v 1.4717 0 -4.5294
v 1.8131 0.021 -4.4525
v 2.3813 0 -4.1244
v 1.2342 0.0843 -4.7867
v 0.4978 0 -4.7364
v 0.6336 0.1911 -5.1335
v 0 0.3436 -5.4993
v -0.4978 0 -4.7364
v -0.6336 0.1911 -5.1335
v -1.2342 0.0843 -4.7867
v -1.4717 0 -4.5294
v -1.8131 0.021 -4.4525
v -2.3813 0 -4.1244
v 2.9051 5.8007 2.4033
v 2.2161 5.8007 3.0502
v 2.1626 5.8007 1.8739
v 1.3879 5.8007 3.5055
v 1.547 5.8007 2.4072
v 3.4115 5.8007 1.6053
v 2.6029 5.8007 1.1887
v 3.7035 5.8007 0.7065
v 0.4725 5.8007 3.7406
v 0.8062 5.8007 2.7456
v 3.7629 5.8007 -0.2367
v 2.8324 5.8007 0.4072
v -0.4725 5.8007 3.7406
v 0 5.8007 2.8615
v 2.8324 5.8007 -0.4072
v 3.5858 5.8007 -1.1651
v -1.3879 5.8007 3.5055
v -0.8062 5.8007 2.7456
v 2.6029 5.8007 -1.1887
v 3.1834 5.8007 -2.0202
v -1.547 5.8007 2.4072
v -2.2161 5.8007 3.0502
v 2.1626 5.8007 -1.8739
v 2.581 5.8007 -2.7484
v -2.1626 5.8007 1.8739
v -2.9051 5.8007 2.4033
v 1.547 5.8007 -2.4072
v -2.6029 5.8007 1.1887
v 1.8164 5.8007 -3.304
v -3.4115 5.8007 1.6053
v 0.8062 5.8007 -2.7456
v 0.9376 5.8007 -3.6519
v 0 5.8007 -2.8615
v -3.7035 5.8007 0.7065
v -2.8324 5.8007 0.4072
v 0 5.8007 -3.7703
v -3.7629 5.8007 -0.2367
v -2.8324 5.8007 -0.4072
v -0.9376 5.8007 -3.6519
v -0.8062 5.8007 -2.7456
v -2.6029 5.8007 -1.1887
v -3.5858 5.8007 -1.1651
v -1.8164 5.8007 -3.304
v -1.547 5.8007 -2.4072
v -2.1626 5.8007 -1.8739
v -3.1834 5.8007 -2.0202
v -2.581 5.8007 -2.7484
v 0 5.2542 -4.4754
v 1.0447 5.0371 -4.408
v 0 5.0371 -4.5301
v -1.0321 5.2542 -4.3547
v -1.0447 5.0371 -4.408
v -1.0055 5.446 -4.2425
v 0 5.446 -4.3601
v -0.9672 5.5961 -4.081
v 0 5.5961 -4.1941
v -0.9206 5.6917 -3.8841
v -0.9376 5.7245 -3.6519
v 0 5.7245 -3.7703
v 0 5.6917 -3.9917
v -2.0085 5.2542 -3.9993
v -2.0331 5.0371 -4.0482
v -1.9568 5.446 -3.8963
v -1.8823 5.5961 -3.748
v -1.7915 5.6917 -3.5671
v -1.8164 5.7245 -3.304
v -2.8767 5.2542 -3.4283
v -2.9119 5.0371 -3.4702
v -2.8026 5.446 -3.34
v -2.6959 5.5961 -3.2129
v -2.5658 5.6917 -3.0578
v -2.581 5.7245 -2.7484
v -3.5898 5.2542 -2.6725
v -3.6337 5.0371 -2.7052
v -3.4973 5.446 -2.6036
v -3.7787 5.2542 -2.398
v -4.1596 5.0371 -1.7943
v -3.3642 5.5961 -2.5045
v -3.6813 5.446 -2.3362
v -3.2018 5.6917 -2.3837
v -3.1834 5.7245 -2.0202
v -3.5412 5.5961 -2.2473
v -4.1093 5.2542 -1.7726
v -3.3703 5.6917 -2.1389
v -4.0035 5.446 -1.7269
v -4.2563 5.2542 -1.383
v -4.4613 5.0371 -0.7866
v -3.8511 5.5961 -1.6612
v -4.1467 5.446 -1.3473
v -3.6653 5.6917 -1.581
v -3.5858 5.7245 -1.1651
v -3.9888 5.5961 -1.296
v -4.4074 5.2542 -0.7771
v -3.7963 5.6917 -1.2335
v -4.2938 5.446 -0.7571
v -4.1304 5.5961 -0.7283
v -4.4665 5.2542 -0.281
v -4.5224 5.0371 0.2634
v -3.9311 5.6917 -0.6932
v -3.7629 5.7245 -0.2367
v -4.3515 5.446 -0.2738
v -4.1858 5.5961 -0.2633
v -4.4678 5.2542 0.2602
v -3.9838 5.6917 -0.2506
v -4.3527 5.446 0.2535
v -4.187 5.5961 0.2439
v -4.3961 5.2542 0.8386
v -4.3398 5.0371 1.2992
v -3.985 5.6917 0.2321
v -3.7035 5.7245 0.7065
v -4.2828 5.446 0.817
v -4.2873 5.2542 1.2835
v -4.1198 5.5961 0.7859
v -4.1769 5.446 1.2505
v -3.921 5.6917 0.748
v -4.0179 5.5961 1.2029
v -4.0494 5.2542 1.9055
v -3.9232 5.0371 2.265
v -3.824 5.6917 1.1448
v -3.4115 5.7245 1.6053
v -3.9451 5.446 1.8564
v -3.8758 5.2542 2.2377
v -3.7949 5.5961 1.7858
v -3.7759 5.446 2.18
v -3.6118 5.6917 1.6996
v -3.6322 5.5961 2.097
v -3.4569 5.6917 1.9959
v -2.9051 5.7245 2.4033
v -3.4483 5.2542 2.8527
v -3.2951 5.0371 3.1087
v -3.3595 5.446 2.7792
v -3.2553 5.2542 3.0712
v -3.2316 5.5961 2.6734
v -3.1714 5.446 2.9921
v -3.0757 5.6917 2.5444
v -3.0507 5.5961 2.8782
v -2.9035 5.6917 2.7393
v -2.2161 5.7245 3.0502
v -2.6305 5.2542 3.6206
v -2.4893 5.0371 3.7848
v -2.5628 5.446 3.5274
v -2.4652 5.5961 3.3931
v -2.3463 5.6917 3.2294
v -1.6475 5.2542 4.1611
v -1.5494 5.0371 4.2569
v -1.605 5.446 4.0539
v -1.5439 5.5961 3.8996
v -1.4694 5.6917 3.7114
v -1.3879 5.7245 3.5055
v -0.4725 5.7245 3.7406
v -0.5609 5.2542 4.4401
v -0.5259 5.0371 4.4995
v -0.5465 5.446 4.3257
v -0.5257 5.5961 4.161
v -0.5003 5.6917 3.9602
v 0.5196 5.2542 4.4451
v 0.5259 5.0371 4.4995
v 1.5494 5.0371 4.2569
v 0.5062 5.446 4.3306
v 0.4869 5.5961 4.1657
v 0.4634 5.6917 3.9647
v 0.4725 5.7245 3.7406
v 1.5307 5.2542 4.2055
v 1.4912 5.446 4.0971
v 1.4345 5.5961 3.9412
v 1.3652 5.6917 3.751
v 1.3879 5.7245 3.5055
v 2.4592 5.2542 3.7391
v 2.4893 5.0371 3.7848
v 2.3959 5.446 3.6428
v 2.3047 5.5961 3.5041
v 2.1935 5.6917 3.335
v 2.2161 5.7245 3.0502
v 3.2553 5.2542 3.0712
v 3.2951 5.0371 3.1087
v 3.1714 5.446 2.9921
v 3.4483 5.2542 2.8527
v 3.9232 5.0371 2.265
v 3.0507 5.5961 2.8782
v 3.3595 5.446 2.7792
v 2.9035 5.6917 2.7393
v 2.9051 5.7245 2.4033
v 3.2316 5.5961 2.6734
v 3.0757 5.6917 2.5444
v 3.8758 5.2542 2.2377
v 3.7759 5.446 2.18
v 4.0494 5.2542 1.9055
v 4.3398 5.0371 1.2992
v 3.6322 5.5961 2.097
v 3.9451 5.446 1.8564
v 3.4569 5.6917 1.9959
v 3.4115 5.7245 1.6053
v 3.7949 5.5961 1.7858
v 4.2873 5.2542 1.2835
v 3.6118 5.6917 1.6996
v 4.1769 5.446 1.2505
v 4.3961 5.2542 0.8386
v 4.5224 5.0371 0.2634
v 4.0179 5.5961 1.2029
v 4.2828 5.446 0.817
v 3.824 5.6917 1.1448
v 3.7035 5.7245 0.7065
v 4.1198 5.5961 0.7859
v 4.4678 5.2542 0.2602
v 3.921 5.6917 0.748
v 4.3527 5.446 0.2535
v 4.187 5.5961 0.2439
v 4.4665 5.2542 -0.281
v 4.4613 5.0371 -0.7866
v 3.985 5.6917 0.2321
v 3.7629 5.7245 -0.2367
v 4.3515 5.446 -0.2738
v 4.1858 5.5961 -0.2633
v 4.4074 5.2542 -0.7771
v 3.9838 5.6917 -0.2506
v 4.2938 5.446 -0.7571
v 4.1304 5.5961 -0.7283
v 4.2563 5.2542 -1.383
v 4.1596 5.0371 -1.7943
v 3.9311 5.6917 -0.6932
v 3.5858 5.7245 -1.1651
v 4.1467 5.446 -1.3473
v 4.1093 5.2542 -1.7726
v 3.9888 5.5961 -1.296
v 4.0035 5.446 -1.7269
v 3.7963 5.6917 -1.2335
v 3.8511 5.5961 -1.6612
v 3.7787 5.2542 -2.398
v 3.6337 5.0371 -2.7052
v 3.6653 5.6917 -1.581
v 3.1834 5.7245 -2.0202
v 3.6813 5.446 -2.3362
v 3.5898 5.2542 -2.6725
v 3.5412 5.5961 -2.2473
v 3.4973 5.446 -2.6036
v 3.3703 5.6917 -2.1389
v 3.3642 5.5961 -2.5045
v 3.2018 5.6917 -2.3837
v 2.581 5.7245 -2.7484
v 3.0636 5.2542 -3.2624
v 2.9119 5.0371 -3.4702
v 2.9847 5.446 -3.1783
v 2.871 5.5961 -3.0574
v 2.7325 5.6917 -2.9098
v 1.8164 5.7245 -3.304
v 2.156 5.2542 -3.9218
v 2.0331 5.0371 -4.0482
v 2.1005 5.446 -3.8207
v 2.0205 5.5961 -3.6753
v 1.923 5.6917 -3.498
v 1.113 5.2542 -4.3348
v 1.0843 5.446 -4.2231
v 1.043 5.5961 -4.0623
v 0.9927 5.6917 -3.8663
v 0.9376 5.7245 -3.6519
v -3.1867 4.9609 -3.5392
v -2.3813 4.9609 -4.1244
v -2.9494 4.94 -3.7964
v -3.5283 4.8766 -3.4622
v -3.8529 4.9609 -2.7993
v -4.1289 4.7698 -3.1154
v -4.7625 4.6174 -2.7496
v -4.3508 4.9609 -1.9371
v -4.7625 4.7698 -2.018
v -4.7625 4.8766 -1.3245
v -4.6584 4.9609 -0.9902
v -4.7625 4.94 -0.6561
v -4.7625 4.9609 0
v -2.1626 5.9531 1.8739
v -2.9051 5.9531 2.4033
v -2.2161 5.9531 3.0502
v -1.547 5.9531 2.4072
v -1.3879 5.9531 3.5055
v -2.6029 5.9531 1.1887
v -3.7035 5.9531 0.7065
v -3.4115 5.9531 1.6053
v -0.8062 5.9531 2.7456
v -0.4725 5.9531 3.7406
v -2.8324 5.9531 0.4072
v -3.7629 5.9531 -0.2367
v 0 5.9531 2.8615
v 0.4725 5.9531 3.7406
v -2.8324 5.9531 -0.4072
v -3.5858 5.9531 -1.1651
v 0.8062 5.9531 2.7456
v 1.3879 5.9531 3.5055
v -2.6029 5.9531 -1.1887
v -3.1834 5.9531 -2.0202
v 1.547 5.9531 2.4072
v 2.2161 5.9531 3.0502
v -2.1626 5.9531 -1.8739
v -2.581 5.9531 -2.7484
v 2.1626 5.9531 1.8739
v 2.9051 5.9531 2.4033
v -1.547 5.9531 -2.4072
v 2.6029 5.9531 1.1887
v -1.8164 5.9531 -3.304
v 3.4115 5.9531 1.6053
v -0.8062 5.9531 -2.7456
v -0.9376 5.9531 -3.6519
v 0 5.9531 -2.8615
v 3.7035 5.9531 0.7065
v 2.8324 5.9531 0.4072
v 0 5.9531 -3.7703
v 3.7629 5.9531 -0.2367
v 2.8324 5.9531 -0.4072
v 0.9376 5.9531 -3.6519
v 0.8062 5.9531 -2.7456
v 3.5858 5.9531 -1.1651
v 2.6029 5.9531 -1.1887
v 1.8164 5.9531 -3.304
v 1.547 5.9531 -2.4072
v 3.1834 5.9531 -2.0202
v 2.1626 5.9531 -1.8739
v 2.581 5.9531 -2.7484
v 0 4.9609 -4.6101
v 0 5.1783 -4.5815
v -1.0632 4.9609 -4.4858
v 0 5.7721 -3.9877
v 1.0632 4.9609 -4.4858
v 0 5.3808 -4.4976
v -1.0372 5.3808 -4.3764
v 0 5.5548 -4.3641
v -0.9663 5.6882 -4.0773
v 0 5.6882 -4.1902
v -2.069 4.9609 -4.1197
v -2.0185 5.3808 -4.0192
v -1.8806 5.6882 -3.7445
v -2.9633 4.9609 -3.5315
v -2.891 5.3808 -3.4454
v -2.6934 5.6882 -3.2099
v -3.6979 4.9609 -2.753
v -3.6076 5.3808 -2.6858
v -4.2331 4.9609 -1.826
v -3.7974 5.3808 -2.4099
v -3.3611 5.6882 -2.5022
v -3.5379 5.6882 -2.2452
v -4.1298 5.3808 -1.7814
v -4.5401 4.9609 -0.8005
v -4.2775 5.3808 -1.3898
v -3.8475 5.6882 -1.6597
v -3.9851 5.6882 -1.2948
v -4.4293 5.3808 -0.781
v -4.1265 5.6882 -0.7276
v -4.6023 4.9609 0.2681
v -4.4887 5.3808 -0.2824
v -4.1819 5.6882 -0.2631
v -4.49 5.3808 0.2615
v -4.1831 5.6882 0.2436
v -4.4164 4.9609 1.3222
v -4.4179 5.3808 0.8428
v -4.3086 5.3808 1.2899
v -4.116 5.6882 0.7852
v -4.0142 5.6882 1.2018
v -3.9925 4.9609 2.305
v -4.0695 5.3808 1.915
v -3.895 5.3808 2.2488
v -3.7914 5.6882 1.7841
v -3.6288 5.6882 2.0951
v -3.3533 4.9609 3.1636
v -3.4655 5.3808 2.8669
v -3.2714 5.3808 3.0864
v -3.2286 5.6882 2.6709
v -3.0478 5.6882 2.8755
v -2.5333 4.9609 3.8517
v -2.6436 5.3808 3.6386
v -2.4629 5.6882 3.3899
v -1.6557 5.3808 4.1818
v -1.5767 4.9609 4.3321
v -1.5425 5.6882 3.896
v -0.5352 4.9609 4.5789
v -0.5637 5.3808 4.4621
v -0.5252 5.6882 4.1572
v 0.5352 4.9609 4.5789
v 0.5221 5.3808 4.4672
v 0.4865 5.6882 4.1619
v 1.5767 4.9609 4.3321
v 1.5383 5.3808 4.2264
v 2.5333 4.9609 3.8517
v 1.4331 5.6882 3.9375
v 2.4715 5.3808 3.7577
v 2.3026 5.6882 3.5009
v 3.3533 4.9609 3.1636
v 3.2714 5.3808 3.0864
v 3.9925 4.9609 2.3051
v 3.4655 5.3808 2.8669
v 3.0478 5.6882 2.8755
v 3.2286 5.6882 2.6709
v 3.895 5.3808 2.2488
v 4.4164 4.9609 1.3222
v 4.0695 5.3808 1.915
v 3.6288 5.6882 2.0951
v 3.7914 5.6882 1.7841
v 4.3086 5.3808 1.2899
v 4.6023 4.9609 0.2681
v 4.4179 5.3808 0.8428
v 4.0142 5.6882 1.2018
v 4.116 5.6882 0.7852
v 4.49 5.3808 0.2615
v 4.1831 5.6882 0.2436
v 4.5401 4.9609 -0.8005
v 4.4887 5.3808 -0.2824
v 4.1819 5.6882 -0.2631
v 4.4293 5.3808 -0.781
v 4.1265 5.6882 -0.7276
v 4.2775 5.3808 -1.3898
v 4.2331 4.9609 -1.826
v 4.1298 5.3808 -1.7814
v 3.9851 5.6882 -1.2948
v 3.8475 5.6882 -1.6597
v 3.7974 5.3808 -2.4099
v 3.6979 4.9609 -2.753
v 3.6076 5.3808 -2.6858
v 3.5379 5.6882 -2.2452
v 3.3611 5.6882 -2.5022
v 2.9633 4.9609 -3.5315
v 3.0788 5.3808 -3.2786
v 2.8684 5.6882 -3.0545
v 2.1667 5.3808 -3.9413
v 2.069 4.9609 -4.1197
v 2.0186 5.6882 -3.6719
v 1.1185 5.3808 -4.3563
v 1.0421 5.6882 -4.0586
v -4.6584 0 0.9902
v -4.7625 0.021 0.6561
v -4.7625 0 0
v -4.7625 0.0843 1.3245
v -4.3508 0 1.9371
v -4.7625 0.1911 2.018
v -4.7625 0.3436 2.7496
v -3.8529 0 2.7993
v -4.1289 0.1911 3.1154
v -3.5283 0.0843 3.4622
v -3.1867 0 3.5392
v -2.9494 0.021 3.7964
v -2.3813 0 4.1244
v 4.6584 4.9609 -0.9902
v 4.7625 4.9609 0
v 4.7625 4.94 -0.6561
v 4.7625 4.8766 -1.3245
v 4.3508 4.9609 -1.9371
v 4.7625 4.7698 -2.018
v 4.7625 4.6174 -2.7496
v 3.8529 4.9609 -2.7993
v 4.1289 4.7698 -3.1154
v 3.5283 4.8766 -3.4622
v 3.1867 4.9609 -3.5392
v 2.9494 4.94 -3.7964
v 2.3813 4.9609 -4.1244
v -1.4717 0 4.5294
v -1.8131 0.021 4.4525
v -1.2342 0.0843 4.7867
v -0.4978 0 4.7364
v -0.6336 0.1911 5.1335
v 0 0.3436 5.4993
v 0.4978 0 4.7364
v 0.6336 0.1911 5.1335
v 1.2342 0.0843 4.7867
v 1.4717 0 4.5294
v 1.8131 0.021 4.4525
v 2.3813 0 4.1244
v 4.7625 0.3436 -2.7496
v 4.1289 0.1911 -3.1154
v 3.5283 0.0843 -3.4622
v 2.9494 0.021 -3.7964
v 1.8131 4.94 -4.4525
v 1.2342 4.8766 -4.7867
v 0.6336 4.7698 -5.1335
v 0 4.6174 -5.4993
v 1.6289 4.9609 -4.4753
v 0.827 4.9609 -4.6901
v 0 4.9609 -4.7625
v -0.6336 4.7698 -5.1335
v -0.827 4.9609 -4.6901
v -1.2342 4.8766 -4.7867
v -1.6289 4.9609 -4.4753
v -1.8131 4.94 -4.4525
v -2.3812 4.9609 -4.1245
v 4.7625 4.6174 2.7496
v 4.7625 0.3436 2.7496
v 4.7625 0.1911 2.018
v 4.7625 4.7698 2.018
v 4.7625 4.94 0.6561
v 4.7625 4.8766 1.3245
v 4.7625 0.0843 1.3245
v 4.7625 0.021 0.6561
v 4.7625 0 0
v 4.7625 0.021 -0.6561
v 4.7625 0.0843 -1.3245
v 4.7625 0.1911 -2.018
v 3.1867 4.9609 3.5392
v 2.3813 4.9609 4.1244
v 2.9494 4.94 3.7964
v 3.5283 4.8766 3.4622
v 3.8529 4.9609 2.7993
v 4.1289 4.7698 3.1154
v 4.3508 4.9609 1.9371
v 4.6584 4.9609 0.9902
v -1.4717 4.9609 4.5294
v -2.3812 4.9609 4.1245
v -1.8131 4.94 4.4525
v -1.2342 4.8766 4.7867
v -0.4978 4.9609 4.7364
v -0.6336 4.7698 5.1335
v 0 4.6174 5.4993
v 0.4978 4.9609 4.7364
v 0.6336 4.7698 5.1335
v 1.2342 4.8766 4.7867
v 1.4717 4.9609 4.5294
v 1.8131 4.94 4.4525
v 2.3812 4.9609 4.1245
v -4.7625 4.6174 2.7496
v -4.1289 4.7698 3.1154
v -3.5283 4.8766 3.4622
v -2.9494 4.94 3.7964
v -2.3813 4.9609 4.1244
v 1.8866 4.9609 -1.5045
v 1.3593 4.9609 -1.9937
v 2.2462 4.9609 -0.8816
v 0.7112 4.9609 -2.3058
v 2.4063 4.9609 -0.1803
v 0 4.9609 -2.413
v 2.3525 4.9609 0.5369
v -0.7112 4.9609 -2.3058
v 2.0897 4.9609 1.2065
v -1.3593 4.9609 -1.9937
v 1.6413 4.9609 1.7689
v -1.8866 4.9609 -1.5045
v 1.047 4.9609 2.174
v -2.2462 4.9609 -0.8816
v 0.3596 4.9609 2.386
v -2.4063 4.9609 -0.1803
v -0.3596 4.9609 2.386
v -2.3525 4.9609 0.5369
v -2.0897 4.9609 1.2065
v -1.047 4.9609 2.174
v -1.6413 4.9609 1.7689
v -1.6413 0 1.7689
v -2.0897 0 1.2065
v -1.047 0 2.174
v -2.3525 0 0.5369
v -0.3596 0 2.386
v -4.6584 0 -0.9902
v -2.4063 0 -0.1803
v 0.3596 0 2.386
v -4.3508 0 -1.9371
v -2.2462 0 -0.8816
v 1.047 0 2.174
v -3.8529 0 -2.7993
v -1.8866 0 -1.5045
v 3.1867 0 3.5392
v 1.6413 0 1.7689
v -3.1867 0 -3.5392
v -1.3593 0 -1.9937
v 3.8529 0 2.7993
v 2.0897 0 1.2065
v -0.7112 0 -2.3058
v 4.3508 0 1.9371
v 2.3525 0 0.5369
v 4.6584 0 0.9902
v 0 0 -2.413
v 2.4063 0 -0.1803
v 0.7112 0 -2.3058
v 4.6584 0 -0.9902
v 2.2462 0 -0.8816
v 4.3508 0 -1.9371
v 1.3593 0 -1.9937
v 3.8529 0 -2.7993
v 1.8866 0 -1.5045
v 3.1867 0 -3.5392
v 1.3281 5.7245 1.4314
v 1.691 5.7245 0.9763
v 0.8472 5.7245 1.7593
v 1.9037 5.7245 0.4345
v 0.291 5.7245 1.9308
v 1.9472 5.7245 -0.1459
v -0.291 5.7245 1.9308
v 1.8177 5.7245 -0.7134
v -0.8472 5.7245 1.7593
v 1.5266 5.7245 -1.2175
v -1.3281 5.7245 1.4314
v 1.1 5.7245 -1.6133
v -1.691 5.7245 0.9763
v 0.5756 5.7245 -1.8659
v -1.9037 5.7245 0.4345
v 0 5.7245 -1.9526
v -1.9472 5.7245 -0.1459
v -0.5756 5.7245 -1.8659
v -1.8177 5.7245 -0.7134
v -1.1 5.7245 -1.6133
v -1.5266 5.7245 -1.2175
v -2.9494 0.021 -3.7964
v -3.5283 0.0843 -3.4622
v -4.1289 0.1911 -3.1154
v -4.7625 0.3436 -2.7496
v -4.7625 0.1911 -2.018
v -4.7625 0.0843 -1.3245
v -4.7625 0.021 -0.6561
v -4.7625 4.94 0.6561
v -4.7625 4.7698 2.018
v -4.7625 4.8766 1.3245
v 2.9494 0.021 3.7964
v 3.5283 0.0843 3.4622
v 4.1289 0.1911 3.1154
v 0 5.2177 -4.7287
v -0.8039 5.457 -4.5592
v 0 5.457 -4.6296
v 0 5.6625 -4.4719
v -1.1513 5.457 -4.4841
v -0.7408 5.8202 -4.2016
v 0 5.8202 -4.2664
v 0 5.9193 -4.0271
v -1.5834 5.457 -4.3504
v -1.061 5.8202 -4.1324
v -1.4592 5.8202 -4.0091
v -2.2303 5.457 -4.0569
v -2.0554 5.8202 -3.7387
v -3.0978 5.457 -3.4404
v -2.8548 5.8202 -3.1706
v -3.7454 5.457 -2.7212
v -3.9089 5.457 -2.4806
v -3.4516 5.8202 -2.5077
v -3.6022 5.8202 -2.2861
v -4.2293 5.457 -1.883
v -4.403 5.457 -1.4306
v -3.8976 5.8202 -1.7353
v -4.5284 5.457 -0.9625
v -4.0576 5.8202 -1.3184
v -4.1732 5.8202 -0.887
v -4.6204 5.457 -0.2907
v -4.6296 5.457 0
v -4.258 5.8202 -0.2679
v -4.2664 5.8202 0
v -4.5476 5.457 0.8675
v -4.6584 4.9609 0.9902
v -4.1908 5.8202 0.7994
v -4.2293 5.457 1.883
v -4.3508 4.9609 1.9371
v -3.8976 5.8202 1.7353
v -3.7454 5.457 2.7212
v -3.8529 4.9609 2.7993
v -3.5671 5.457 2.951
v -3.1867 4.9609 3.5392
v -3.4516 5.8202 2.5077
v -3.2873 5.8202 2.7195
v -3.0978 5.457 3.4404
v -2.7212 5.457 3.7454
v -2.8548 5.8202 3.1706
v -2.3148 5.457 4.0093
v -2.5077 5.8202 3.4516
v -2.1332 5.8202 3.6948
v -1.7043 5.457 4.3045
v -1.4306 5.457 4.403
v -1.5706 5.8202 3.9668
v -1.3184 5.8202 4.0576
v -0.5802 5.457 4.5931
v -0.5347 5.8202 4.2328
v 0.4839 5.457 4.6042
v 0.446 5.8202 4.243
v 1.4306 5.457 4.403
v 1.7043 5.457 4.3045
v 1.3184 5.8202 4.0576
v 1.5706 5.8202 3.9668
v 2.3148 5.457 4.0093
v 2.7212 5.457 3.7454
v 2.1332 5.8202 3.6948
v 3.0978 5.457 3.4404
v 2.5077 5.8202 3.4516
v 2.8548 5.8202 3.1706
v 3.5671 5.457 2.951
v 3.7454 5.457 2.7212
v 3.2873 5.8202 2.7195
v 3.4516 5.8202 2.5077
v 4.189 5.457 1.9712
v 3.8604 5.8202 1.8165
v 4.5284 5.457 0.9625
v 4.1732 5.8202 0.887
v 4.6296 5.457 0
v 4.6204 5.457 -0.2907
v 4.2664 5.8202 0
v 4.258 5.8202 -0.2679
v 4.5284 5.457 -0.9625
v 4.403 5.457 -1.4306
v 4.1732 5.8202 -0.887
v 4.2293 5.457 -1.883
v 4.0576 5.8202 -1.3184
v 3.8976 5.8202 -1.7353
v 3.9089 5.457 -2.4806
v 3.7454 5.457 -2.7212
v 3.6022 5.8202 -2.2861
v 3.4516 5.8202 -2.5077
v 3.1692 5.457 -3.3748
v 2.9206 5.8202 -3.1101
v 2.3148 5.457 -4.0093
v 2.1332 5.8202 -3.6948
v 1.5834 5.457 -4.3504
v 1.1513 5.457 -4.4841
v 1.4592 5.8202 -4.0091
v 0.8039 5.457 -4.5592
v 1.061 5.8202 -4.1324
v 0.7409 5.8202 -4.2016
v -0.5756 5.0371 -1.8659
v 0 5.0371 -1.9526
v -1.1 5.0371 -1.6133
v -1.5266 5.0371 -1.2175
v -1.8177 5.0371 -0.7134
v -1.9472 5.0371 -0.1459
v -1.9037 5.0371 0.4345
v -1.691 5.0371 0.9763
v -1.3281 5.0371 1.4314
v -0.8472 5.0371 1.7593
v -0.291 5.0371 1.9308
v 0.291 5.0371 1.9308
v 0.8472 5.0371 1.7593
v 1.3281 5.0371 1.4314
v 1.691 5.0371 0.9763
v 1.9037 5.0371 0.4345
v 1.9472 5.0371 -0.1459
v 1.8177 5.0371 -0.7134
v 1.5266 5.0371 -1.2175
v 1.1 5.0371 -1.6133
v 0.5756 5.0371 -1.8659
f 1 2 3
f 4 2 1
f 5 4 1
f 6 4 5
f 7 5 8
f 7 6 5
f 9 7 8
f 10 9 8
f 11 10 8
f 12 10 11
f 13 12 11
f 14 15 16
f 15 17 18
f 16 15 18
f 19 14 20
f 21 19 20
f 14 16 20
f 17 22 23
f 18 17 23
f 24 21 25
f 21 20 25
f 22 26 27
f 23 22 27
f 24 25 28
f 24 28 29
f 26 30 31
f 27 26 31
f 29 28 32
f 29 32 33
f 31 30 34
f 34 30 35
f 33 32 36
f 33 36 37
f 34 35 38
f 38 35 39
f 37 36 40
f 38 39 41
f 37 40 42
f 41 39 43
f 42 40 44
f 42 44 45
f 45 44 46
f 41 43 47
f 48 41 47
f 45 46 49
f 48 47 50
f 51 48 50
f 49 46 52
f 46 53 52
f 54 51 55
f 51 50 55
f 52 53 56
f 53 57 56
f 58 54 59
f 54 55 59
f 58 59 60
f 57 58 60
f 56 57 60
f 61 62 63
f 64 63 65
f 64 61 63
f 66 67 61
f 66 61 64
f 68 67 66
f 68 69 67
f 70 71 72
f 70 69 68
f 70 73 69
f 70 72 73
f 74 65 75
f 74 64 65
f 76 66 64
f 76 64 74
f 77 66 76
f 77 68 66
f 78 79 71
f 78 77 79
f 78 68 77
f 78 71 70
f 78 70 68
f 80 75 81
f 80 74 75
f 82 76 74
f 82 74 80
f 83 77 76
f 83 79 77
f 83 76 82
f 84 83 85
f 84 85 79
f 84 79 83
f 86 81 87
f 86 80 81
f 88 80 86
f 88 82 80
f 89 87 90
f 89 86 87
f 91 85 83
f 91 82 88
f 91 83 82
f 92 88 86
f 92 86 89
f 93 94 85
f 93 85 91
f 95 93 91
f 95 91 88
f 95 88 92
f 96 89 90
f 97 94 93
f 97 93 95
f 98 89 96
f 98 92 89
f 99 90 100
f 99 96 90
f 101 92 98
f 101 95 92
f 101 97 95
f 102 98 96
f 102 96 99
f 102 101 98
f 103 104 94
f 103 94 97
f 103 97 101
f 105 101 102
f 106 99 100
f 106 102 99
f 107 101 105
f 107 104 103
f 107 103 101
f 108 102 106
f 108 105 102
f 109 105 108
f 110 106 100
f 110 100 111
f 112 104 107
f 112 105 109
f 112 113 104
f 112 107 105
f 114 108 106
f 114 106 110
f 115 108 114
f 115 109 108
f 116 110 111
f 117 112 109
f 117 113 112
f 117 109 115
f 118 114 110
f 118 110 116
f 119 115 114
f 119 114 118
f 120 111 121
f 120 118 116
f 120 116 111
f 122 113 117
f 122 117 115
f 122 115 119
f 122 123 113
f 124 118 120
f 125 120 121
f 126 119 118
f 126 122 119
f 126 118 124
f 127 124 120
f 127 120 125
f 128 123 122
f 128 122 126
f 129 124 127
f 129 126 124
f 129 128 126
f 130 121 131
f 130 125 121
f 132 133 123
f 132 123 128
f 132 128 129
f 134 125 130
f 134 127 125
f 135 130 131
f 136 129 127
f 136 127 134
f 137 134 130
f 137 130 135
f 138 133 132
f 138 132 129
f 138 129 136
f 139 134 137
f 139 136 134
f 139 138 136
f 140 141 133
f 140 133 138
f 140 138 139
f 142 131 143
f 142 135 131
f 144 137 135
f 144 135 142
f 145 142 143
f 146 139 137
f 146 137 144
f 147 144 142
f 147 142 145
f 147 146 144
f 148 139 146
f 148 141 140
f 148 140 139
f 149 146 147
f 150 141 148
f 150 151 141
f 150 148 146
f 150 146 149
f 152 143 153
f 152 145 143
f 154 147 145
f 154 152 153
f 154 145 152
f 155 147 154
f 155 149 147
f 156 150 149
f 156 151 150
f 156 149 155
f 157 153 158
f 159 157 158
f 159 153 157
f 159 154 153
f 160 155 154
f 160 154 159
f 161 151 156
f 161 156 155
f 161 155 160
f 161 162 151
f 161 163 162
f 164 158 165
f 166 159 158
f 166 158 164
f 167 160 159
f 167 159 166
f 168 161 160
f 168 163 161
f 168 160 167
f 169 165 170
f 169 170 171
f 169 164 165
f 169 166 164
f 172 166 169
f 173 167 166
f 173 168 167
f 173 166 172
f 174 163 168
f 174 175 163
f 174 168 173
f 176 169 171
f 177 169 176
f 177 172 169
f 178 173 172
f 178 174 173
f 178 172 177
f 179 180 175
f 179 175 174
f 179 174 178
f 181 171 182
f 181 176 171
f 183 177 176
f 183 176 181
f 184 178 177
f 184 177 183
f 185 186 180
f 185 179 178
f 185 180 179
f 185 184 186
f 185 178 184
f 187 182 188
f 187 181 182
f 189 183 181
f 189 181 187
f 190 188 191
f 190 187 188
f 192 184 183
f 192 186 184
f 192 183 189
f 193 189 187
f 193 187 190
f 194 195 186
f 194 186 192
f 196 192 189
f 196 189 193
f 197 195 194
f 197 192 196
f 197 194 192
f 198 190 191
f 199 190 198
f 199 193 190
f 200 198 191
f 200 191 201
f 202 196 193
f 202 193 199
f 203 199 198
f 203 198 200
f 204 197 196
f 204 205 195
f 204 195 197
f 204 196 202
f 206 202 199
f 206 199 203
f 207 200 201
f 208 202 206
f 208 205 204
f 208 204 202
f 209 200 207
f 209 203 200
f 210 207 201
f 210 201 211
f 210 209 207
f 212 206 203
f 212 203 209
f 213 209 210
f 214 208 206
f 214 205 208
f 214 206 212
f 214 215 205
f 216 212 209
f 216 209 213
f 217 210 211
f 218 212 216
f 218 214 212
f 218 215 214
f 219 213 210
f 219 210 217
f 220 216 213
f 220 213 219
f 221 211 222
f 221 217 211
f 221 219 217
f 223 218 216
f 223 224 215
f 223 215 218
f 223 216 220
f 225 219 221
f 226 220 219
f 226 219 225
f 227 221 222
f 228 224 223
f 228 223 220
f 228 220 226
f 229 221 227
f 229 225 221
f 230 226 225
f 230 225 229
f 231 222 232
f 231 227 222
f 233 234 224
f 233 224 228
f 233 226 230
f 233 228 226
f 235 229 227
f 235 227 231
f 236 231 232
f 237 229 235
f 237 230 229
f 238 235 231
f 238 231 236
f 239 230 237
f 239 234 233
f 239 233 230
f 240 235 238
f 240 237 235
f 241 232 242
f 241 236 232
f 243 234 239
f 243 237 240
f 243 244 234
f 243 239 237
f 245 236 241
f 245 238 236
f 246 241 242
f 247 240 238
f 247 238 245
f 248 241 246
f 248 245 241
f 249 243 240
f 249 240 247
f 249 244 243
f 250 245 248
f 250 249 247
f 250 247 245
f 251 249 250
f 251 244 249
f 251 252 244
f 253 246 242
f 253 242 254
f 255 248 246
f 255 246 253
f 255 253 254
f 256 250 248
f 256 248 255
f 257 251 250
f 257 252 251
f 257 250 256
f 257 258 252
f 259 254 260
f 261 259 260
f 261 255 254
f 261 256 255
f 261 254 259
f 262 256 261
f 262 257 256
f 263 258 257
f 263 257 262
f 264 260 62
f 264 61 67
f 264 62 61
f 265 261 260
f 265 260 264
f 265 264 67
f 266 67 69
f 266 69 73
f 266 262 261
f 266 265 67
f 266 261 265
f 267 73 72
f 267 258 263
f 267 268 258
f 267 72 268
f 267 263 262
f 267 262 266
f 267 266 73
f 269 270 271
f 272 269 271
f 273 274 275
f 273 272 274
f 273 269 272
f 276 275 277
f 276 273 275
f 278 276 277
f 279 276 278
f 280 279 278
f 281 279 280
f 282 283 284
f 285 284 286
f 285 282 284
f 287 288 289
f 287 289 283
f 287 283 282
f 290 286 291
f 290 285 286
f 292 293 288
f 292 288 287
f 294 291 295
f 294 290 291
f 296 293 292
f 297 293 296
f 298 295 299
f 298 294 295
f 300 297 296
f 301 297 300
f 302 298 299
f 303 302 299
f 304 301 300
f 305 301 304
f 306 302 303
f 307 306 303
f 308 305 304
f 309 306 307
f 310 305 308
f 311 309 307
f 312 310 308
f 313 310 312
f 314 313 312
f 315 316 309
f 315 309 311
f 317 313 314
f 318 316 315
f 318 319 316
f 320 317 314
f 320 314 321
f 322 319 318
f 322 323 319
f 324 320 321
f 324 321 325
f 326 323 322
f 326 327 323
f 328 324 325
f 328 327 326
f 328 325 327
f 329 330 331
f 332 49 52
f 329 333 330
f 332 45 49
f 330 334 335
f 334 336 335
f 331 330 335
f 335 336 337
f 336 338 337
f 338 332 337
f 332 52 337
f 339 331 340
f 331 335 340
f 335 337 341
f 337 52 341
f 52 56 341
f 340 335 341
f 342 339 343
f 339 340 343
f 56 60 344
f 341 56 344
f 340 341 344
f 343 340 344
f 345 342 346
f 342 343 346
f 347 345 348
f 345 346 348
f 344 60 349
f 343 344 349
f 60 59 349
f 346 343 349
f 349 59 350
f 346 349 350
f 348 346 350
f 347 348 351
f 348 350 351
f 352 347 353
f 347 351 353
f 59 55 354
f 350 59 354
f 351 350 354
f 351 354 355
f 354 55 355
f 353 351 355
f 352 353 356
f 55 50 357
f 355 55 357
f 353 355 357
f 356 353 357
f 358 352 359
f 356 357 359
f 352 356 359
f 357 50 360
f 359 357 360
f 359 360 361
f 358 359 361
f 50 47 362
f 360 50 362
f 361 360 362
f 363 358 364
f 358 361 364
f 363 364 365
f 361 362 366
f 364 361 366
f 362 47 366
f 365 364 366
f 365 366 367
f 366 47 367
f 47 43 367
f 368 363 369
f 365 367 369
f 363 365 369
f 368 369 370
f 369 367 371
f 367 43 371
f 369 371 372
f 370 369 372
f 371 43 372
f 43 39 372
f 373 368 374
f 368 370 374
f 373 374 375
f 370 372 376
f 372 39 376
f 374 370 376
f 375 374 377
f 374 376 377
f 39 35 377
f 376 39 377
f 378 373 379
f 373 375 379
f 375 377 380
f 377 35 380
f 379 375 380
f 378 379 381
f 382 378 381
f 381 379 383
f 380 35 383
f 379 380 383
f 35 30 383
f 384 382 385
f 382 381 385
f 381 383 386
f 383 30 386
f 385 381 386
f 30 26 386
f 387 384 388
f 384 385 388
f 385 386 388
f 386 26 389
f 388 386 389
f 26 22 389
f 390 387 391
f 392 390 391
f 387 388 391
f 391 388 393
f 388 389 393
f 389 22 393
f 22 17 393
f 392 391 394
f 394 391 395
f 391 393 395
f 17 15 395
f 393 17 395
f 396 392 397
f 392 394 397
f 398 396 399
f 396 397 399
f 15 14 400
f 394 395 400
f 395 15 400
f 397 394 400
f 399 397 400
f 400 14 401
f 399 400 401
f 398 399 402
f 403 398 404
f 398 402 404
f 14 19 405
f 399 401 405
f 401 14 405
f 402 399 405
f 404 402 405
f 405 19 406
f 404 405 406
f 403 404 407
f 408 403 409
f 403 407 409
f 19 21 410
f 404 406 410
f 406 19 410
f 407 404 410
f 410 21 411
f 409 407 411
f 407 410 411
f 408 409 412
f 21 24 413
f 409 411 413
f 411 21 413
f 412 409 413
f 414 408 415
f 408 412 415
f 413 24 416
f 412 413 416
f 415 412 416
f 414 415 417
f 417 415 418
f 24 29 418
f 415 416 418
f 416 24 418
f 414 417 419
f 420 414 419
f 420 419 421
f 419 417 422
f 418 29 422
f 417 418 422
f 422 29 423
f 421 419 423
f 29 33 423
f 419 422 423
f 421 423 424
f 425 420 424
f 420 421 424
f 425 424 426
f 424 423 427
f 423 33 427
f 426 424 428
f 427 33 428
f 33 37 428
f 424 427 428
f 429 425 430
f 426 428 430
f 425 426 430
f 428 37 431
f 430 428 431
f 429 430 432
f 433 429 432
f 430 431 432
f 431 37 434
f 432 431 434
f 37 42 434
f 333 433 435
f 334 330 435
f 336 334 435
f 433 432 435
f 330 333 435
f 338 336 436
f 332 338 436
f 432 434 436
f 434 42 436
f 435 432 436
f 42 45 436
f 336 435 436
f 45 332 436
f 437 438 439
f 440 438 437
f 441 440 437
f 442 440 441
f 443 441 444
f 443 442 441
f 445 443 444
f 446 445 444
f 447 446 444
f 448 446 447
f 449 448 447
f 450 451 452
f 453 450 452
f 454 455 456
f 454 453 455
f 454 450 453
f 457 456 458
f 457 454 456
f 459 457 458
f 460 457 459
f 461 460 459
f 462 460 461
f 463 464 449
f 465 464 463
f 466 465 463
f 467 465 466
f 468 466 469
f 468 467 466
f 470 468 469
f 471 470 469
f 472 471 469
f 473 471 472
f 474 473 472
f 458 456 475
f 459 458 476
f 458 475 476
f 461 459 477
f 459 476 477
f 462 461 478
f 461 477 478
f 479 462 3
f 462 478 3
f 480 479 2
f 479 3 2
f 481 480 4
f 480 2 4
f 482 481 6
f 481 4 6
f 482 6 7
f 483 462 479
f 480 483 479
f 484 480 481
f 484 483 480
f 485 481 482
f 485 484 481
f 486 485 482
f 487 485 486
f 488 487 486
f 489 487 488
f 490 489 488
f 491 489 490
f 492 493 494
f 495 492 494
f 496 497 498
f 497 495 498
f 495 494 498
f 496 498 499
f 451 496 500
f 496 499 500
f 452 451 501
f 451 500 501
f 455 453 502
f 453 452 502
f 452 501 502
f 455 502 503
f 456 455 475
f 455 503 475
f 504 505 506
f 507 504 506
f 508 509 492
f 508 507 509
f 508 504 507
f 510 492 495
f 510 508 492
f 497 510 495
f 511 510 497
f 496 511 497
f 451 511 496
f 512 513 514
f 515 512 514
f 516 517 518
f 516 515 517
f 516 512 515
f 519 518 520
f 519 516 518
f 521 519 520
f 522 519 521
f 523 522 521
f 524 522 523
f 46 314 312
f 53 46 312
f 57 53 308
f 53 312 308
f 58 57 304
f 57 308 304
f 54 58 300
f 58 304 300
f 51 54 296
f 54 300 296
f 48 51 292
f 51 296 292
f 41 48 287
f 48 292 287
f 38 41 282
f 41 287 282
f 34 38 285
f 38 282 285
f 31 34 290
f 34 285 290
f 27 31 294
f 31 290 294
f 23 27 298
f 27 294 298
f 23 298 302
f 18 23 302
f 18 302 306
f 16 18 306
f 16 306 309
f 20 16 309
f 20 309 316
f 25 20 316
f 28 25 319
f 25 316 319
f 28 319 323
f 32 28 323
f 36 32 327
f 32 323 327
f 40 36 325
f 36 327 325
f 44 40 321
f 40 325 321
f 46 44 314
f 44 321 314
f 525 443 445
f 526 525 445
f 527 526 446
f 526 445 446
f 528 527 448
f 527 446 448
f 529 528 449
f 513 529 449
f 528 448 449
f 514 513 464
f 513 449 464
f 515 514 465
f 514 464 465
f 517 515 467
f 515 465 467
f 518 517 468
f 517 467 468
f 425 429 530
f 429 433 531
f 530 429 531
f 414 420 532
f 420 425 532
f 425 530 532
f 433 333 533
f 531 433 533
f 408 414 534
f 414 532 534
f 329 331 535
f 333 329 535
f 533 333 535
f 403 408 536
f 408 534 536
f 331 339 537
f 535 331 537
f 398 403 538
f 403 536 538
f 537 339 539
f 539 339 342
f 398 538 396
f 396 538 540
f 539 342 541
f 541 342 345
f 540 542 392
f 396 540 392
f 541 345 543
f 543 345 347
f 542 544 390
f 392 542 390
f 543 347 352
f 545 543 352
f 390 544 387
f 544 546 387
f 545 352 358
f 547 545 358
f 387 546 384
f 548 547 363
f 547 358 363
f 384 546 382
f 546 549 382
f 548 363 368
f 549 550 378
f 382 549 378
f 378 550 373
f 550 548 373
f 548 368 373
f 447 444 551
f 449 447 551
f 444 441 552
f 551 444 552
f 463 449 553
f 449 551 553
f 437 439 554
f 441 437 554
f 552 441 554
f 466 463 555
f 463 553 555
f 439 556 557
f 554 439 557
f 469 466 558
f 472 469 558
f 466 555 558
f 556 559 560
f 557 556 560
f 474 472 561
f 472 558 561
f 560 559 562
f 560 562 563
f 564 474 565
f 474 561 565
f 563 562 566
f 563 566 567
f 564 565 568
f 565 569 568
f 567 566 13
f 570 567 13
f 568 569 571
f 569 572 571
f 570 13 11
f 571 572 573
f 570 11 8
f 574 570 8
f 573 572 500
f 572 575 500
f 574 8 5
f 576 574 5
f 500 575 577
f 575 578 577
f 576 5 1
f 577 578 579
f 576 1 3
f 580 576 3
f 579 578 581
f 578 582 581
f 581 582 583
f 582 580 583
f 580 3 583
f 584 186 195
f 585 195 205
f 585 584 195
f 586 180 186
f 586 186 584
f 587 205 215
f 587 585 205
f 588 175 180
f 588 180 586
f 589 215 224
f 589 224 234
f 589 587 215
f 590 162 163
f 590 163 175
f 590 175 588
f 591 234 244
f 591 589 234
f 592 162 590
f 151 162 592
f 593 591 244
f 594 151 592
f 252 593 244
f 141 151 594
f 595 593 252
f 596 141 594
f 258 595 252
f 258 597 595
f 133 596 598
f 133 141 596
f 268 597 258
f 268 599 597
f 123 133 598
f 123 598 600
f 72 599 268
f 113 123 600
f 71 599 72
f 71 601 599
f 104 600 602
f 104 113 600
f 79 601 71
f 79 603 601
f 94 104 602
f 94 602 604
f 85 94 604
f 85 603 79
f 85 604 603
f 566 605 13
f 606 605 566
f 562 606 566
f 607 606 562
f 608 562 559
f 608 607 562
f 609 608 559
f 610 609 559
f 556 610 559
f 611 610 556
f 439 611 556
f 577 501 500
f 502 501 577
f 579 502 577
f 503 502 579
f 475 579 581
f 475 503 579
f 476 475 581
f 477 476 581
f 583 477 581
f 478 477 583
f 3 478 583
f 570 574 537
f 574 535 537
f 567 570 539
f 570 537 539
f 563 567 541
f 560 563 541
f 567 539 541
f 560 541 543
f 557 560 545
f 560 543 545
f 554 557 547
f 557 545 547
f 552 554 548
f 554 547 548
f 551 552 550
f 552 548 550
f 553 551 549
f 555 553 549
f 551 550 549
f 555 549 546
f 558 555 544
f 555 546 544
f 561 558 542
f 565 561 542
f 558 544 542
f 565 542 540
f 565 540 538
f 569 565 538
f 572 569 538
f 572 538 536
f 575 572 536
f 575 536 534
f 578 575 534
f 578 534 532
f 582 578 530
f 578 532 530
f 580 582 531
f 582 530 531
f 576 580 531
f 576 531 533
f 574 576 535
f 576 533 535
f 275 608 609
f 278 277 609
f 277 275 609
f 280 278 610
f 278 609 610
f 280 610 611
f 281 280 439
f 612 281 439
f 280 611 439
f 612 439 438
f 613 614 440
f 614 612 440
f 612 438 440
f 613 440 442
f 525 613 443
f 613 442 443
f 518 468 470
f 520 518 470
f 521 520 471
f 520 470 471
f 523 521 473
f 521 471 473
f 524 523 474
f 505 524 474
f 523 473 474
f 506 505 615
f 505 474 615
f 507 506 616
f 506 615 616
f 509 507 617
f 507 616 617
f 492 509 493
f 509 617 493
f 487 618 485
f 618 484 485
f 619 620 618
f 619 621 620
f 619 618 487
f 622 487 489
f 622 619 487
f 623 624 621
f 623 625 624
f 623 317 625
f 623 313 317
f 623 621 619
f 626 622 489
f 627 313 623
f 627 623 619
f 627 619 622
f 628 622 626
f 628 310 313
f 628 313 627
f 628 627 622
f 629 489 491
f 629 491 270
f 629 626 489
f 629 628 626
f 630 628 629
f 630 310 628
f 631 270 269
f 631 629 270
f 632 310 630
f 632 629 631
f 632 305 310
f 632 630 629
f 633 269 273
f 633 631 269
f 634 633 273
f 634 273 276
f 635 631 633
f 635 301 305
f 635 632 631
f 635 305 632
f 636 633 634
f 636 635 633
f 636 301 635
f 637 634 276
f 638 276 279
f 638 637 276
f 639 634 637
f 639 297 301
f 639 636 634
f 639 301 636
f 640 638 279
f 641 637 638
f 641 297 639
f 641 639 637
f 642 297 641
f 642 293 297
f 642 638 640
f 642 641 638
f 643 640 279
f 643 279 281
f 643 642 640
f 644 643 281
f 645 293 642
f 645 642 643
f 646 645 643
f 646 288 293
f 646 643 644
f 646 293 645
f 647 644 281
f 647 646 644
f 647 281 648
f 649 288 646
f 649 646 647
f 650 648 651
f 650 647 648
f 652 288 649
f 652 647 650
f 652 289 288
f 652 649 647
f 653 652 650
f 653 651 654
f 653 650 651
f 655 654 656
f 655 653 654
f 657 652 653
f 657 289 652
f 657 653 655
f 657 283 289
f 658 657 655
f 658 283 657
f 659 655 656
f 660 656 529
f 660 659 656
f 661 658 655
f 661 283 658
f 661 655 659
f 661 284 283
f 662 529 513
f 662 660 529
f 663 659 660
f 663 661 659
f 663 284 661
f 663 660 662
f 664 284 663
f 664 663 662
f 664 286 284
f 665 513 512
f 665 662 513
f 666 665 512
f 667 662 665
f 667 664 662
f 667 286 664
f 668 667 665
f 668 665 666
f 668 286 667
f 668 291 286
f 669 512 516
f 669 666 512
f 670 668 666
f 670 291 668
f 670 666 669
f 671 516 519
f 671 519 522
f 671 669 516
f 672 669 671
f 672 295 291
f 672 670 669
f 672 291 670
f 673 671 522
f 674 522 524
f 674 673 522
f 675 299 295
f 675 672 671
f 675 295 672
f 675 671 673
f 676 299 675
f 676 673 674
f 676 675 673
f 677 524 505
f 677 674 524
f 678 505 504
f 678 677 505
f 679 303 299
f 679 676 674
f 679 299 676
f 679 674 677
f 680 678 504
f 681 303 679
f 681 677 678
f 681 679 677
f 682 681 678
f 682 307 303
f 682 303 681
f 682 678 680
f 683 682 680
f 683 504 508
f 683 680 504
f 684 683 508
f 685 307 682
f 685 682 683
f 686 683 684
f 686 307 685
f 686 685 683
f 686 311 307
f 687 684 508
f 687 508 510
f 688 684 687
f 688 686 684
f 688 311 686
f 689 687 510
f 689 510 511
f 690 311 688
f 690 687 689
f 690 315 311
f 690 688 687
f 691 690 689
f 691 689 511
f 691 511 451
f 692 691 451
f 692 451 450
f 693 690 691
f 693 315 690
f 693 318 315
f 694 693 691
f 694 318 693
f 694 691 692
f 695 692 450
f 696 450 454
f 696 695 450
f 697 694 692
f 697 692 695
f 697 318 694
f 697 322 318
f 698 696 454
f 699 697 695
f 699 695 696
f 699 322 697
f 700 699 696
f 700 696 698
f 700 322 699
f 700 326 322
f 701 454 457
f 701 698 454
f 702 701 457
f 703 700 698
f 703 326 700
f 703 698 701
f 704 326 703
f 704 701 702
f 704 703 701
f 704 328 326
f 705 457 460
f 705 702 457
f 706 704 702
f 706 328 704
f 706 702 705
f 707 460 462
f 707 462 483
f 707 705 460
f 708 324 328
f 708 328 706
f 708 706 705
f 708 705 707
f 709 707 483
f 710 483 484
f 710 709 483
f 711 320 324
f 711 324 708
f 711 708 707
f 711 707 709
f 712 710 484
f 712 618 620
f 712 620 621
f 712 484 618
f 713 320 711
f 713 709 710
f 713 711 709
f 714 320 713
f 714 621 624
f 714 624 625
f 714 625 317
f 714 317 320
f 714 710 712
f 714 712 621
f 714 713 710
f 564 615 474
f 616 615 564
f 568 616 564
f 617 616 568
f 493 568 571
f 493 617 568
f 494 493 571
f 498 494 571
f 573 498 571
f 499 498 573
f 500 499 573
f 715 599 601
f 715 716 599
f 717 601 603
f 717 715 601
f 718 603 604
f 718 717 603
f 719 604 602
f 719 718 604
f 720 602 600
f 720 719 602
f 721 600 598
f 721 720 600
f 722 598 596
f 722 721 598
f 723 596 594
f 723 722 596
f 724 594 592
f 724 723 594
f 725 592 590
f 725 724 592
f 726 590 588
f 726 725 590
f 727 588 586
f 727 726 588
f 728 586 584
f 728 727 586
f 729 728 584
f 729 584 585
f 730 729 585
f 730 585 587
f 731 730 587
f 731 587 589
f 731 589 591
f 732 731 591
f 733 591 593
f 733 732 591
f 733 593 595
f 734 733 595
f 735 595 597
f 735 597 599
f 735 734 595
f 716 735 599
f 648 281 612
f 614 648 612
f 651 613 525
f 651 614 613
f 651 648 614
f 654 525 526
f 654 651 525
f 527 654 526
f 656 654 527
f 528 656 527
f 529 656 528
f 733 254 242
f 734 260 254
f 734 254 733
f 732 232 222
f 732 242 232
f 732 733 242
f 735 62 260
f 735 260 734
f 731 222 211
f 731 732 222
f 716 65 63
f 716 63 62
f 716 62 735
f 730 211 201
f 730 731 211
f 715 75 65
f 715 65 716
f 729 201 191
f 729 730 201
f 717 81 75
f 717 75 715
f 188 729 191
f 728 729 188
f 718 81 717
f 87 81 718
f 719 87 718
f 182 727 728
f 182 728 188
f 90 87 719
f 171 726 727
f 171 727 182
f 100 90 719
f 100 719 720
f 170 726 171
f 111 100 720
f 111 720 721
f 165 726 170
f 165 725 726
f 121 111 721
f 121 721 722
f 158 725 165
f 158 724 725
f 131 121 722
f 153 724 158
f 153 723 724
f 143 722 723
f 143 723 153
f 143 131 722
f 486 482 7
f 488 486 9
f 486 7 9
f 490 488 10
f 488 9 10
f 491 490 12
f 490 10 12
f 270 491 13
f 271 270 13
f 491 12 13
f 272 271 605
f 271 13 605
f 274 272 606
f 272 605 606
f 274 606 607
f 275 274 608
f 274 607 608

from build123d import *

# Parameters (mm, degrees)
EXTRUDE1_DEPTH = 5.953125
SKETCH2_W      = 2.413
SKETCH2_H      = 5.953125


with BuildPart() as part:
    # Sketch1 → Extrude1 (new body)
    with BuildSketch(Plane(origin=(0, 0, 0), x_dir=(1, 0, 0), z_dir=(0, 1, 0))):
        Polygon((0, 5.499261314), (-4.7625, 2.749630657), (-4.7625, -2.749630657), (0, -5.499261314), (4.7625, -2.749630657), (4.7625, 2.749630657), align=None)
    extrude(amount=EXTRUDE1_DEPTH)

    # Sketch4 → Cut-Revolve2 (revolve, cut)
    with BuildSketch(Plane(origin=(0, 0, 0), x_dir=(0, 0, -1), z_dir=(1, 0, 0))):
        Polygon((0, 5.953125), (2.413, 5.953125), (1.952639712, 5.738455472), (1.952639712, 0.214669528), (2.413, 0), (0, 0), align=None)
    revolve(axis=Axis((0, 5.953125, 0), (0, 1, 0)), mode=Mode.SUBTRACT)


with BuildPart() as body_2:
    # Sketch2 → Revolve1 (revolve)
    with BuildSketch(Plane(origin=(0, 0, 0), x_dir=(0, 0, -1), z_dir=(1, 0, 0))):
        with Locations((1.2065, 2.9765625)):
            Rectangle(SKETCH2_W, SKETCH2_H)
    revolve(axis=Axis((0, -2.413, 0), (0, 1, 0)))


with BuildPart() as part_1:
    add(part.part)

    # Combine1: cut body 2
    add(body_2.part, mode=Mode.SUBTRACT)

    # Sketch5 → Cut-Revolve3 (revolve, cut)
    with BuildSketch(Plane(origin=(0, 0, 0), x_dir=(0, 0, -1), z_dir=(1, 0, 0))):
        with BuildLine():
            Line((0, 0), (4.7625, 0))
            Line((4.7625, 0), (5.499261314, 0.343557443))
            Line((5.499261314, 0.343557443), (5.499261314, 4.617380057))
            Line((5.499261314, 4.617380057), (4.7625, 4.9609375))
            ThreePointArc((4.7625, 4.9609375), (4.471895009, 5.662520009), (3.7703125, 5.953125))
            Line((3.7703125, 5.953125), (3.7703125, 7.223125))
            Line((3.7703125, 7.223125), (6.769261314, 7.223125))
            Line((6.769261314, 7.223125), (6.769261314, -1.27))
            Line((6.769261314, -1.27), (0, -1.27))
            Line((0, -1.27), (0, 0))
        make_face()
    revolve(axis=Axis((0, 0, 0), (0, 1, 0)), mode=Mode.SUBTRACT)

    # Sketch6 → Cut-Revolve4 (revolve, cut)
    with BuildSketch(Plane(origin=(0, 0, 0), x_dir=(0, 0, -1), z_dir=(1, 0, 0))):
        with BuildLine():
            Line((0, 4.9609375), (4.6101, 4.9609375))
            ThreePointArc((4.6101, 4.9609375), (4.364131936, 5.554756936), (3.7703125, 5.800725))
            Line((3.7703125, 5.800725), (2.861476106, 5.800725))
            Line((2.861476106, 5.800725), (2.861476106, 7.223125))
            Line((2.861476106, 7.223125), (0, 7.223125))
            Line((0, 7.223125), (0, 4.9609375))
        make_face()
    revolve(axis=Axis((0, 7.223125, 0), (0, 1, 0)), mode=Mode.SUBTRACT)


with BuildPart() as body_2_2:
    # Sketch7 → Revolve2 (revolve)
    with BuildSketch(Plane(origin=(0, 0, 0), x_dir=(0, 0, -1), z_dir=(1, 0, 0))):
        with BuildLine():
            Line((1.952639712, 5.0371375), (4.530088408, 5.0371375))
            ThreePointArc((4.530088408, 5.0371375), (4.282601726, 5.527175629), (3.7703125, 5.724525))
            Line((3.7703125, 5.724525), (1.952639712, 5.724525))
            Line((1.952639712, 5.724525), (1.952639712, 5.0371375))
        make_face()
    revolve(axis=Axis((0, 5.0371375, 0), (0, 1, 0)))


solid = Compound([part_1.part, body_2_2.part])
